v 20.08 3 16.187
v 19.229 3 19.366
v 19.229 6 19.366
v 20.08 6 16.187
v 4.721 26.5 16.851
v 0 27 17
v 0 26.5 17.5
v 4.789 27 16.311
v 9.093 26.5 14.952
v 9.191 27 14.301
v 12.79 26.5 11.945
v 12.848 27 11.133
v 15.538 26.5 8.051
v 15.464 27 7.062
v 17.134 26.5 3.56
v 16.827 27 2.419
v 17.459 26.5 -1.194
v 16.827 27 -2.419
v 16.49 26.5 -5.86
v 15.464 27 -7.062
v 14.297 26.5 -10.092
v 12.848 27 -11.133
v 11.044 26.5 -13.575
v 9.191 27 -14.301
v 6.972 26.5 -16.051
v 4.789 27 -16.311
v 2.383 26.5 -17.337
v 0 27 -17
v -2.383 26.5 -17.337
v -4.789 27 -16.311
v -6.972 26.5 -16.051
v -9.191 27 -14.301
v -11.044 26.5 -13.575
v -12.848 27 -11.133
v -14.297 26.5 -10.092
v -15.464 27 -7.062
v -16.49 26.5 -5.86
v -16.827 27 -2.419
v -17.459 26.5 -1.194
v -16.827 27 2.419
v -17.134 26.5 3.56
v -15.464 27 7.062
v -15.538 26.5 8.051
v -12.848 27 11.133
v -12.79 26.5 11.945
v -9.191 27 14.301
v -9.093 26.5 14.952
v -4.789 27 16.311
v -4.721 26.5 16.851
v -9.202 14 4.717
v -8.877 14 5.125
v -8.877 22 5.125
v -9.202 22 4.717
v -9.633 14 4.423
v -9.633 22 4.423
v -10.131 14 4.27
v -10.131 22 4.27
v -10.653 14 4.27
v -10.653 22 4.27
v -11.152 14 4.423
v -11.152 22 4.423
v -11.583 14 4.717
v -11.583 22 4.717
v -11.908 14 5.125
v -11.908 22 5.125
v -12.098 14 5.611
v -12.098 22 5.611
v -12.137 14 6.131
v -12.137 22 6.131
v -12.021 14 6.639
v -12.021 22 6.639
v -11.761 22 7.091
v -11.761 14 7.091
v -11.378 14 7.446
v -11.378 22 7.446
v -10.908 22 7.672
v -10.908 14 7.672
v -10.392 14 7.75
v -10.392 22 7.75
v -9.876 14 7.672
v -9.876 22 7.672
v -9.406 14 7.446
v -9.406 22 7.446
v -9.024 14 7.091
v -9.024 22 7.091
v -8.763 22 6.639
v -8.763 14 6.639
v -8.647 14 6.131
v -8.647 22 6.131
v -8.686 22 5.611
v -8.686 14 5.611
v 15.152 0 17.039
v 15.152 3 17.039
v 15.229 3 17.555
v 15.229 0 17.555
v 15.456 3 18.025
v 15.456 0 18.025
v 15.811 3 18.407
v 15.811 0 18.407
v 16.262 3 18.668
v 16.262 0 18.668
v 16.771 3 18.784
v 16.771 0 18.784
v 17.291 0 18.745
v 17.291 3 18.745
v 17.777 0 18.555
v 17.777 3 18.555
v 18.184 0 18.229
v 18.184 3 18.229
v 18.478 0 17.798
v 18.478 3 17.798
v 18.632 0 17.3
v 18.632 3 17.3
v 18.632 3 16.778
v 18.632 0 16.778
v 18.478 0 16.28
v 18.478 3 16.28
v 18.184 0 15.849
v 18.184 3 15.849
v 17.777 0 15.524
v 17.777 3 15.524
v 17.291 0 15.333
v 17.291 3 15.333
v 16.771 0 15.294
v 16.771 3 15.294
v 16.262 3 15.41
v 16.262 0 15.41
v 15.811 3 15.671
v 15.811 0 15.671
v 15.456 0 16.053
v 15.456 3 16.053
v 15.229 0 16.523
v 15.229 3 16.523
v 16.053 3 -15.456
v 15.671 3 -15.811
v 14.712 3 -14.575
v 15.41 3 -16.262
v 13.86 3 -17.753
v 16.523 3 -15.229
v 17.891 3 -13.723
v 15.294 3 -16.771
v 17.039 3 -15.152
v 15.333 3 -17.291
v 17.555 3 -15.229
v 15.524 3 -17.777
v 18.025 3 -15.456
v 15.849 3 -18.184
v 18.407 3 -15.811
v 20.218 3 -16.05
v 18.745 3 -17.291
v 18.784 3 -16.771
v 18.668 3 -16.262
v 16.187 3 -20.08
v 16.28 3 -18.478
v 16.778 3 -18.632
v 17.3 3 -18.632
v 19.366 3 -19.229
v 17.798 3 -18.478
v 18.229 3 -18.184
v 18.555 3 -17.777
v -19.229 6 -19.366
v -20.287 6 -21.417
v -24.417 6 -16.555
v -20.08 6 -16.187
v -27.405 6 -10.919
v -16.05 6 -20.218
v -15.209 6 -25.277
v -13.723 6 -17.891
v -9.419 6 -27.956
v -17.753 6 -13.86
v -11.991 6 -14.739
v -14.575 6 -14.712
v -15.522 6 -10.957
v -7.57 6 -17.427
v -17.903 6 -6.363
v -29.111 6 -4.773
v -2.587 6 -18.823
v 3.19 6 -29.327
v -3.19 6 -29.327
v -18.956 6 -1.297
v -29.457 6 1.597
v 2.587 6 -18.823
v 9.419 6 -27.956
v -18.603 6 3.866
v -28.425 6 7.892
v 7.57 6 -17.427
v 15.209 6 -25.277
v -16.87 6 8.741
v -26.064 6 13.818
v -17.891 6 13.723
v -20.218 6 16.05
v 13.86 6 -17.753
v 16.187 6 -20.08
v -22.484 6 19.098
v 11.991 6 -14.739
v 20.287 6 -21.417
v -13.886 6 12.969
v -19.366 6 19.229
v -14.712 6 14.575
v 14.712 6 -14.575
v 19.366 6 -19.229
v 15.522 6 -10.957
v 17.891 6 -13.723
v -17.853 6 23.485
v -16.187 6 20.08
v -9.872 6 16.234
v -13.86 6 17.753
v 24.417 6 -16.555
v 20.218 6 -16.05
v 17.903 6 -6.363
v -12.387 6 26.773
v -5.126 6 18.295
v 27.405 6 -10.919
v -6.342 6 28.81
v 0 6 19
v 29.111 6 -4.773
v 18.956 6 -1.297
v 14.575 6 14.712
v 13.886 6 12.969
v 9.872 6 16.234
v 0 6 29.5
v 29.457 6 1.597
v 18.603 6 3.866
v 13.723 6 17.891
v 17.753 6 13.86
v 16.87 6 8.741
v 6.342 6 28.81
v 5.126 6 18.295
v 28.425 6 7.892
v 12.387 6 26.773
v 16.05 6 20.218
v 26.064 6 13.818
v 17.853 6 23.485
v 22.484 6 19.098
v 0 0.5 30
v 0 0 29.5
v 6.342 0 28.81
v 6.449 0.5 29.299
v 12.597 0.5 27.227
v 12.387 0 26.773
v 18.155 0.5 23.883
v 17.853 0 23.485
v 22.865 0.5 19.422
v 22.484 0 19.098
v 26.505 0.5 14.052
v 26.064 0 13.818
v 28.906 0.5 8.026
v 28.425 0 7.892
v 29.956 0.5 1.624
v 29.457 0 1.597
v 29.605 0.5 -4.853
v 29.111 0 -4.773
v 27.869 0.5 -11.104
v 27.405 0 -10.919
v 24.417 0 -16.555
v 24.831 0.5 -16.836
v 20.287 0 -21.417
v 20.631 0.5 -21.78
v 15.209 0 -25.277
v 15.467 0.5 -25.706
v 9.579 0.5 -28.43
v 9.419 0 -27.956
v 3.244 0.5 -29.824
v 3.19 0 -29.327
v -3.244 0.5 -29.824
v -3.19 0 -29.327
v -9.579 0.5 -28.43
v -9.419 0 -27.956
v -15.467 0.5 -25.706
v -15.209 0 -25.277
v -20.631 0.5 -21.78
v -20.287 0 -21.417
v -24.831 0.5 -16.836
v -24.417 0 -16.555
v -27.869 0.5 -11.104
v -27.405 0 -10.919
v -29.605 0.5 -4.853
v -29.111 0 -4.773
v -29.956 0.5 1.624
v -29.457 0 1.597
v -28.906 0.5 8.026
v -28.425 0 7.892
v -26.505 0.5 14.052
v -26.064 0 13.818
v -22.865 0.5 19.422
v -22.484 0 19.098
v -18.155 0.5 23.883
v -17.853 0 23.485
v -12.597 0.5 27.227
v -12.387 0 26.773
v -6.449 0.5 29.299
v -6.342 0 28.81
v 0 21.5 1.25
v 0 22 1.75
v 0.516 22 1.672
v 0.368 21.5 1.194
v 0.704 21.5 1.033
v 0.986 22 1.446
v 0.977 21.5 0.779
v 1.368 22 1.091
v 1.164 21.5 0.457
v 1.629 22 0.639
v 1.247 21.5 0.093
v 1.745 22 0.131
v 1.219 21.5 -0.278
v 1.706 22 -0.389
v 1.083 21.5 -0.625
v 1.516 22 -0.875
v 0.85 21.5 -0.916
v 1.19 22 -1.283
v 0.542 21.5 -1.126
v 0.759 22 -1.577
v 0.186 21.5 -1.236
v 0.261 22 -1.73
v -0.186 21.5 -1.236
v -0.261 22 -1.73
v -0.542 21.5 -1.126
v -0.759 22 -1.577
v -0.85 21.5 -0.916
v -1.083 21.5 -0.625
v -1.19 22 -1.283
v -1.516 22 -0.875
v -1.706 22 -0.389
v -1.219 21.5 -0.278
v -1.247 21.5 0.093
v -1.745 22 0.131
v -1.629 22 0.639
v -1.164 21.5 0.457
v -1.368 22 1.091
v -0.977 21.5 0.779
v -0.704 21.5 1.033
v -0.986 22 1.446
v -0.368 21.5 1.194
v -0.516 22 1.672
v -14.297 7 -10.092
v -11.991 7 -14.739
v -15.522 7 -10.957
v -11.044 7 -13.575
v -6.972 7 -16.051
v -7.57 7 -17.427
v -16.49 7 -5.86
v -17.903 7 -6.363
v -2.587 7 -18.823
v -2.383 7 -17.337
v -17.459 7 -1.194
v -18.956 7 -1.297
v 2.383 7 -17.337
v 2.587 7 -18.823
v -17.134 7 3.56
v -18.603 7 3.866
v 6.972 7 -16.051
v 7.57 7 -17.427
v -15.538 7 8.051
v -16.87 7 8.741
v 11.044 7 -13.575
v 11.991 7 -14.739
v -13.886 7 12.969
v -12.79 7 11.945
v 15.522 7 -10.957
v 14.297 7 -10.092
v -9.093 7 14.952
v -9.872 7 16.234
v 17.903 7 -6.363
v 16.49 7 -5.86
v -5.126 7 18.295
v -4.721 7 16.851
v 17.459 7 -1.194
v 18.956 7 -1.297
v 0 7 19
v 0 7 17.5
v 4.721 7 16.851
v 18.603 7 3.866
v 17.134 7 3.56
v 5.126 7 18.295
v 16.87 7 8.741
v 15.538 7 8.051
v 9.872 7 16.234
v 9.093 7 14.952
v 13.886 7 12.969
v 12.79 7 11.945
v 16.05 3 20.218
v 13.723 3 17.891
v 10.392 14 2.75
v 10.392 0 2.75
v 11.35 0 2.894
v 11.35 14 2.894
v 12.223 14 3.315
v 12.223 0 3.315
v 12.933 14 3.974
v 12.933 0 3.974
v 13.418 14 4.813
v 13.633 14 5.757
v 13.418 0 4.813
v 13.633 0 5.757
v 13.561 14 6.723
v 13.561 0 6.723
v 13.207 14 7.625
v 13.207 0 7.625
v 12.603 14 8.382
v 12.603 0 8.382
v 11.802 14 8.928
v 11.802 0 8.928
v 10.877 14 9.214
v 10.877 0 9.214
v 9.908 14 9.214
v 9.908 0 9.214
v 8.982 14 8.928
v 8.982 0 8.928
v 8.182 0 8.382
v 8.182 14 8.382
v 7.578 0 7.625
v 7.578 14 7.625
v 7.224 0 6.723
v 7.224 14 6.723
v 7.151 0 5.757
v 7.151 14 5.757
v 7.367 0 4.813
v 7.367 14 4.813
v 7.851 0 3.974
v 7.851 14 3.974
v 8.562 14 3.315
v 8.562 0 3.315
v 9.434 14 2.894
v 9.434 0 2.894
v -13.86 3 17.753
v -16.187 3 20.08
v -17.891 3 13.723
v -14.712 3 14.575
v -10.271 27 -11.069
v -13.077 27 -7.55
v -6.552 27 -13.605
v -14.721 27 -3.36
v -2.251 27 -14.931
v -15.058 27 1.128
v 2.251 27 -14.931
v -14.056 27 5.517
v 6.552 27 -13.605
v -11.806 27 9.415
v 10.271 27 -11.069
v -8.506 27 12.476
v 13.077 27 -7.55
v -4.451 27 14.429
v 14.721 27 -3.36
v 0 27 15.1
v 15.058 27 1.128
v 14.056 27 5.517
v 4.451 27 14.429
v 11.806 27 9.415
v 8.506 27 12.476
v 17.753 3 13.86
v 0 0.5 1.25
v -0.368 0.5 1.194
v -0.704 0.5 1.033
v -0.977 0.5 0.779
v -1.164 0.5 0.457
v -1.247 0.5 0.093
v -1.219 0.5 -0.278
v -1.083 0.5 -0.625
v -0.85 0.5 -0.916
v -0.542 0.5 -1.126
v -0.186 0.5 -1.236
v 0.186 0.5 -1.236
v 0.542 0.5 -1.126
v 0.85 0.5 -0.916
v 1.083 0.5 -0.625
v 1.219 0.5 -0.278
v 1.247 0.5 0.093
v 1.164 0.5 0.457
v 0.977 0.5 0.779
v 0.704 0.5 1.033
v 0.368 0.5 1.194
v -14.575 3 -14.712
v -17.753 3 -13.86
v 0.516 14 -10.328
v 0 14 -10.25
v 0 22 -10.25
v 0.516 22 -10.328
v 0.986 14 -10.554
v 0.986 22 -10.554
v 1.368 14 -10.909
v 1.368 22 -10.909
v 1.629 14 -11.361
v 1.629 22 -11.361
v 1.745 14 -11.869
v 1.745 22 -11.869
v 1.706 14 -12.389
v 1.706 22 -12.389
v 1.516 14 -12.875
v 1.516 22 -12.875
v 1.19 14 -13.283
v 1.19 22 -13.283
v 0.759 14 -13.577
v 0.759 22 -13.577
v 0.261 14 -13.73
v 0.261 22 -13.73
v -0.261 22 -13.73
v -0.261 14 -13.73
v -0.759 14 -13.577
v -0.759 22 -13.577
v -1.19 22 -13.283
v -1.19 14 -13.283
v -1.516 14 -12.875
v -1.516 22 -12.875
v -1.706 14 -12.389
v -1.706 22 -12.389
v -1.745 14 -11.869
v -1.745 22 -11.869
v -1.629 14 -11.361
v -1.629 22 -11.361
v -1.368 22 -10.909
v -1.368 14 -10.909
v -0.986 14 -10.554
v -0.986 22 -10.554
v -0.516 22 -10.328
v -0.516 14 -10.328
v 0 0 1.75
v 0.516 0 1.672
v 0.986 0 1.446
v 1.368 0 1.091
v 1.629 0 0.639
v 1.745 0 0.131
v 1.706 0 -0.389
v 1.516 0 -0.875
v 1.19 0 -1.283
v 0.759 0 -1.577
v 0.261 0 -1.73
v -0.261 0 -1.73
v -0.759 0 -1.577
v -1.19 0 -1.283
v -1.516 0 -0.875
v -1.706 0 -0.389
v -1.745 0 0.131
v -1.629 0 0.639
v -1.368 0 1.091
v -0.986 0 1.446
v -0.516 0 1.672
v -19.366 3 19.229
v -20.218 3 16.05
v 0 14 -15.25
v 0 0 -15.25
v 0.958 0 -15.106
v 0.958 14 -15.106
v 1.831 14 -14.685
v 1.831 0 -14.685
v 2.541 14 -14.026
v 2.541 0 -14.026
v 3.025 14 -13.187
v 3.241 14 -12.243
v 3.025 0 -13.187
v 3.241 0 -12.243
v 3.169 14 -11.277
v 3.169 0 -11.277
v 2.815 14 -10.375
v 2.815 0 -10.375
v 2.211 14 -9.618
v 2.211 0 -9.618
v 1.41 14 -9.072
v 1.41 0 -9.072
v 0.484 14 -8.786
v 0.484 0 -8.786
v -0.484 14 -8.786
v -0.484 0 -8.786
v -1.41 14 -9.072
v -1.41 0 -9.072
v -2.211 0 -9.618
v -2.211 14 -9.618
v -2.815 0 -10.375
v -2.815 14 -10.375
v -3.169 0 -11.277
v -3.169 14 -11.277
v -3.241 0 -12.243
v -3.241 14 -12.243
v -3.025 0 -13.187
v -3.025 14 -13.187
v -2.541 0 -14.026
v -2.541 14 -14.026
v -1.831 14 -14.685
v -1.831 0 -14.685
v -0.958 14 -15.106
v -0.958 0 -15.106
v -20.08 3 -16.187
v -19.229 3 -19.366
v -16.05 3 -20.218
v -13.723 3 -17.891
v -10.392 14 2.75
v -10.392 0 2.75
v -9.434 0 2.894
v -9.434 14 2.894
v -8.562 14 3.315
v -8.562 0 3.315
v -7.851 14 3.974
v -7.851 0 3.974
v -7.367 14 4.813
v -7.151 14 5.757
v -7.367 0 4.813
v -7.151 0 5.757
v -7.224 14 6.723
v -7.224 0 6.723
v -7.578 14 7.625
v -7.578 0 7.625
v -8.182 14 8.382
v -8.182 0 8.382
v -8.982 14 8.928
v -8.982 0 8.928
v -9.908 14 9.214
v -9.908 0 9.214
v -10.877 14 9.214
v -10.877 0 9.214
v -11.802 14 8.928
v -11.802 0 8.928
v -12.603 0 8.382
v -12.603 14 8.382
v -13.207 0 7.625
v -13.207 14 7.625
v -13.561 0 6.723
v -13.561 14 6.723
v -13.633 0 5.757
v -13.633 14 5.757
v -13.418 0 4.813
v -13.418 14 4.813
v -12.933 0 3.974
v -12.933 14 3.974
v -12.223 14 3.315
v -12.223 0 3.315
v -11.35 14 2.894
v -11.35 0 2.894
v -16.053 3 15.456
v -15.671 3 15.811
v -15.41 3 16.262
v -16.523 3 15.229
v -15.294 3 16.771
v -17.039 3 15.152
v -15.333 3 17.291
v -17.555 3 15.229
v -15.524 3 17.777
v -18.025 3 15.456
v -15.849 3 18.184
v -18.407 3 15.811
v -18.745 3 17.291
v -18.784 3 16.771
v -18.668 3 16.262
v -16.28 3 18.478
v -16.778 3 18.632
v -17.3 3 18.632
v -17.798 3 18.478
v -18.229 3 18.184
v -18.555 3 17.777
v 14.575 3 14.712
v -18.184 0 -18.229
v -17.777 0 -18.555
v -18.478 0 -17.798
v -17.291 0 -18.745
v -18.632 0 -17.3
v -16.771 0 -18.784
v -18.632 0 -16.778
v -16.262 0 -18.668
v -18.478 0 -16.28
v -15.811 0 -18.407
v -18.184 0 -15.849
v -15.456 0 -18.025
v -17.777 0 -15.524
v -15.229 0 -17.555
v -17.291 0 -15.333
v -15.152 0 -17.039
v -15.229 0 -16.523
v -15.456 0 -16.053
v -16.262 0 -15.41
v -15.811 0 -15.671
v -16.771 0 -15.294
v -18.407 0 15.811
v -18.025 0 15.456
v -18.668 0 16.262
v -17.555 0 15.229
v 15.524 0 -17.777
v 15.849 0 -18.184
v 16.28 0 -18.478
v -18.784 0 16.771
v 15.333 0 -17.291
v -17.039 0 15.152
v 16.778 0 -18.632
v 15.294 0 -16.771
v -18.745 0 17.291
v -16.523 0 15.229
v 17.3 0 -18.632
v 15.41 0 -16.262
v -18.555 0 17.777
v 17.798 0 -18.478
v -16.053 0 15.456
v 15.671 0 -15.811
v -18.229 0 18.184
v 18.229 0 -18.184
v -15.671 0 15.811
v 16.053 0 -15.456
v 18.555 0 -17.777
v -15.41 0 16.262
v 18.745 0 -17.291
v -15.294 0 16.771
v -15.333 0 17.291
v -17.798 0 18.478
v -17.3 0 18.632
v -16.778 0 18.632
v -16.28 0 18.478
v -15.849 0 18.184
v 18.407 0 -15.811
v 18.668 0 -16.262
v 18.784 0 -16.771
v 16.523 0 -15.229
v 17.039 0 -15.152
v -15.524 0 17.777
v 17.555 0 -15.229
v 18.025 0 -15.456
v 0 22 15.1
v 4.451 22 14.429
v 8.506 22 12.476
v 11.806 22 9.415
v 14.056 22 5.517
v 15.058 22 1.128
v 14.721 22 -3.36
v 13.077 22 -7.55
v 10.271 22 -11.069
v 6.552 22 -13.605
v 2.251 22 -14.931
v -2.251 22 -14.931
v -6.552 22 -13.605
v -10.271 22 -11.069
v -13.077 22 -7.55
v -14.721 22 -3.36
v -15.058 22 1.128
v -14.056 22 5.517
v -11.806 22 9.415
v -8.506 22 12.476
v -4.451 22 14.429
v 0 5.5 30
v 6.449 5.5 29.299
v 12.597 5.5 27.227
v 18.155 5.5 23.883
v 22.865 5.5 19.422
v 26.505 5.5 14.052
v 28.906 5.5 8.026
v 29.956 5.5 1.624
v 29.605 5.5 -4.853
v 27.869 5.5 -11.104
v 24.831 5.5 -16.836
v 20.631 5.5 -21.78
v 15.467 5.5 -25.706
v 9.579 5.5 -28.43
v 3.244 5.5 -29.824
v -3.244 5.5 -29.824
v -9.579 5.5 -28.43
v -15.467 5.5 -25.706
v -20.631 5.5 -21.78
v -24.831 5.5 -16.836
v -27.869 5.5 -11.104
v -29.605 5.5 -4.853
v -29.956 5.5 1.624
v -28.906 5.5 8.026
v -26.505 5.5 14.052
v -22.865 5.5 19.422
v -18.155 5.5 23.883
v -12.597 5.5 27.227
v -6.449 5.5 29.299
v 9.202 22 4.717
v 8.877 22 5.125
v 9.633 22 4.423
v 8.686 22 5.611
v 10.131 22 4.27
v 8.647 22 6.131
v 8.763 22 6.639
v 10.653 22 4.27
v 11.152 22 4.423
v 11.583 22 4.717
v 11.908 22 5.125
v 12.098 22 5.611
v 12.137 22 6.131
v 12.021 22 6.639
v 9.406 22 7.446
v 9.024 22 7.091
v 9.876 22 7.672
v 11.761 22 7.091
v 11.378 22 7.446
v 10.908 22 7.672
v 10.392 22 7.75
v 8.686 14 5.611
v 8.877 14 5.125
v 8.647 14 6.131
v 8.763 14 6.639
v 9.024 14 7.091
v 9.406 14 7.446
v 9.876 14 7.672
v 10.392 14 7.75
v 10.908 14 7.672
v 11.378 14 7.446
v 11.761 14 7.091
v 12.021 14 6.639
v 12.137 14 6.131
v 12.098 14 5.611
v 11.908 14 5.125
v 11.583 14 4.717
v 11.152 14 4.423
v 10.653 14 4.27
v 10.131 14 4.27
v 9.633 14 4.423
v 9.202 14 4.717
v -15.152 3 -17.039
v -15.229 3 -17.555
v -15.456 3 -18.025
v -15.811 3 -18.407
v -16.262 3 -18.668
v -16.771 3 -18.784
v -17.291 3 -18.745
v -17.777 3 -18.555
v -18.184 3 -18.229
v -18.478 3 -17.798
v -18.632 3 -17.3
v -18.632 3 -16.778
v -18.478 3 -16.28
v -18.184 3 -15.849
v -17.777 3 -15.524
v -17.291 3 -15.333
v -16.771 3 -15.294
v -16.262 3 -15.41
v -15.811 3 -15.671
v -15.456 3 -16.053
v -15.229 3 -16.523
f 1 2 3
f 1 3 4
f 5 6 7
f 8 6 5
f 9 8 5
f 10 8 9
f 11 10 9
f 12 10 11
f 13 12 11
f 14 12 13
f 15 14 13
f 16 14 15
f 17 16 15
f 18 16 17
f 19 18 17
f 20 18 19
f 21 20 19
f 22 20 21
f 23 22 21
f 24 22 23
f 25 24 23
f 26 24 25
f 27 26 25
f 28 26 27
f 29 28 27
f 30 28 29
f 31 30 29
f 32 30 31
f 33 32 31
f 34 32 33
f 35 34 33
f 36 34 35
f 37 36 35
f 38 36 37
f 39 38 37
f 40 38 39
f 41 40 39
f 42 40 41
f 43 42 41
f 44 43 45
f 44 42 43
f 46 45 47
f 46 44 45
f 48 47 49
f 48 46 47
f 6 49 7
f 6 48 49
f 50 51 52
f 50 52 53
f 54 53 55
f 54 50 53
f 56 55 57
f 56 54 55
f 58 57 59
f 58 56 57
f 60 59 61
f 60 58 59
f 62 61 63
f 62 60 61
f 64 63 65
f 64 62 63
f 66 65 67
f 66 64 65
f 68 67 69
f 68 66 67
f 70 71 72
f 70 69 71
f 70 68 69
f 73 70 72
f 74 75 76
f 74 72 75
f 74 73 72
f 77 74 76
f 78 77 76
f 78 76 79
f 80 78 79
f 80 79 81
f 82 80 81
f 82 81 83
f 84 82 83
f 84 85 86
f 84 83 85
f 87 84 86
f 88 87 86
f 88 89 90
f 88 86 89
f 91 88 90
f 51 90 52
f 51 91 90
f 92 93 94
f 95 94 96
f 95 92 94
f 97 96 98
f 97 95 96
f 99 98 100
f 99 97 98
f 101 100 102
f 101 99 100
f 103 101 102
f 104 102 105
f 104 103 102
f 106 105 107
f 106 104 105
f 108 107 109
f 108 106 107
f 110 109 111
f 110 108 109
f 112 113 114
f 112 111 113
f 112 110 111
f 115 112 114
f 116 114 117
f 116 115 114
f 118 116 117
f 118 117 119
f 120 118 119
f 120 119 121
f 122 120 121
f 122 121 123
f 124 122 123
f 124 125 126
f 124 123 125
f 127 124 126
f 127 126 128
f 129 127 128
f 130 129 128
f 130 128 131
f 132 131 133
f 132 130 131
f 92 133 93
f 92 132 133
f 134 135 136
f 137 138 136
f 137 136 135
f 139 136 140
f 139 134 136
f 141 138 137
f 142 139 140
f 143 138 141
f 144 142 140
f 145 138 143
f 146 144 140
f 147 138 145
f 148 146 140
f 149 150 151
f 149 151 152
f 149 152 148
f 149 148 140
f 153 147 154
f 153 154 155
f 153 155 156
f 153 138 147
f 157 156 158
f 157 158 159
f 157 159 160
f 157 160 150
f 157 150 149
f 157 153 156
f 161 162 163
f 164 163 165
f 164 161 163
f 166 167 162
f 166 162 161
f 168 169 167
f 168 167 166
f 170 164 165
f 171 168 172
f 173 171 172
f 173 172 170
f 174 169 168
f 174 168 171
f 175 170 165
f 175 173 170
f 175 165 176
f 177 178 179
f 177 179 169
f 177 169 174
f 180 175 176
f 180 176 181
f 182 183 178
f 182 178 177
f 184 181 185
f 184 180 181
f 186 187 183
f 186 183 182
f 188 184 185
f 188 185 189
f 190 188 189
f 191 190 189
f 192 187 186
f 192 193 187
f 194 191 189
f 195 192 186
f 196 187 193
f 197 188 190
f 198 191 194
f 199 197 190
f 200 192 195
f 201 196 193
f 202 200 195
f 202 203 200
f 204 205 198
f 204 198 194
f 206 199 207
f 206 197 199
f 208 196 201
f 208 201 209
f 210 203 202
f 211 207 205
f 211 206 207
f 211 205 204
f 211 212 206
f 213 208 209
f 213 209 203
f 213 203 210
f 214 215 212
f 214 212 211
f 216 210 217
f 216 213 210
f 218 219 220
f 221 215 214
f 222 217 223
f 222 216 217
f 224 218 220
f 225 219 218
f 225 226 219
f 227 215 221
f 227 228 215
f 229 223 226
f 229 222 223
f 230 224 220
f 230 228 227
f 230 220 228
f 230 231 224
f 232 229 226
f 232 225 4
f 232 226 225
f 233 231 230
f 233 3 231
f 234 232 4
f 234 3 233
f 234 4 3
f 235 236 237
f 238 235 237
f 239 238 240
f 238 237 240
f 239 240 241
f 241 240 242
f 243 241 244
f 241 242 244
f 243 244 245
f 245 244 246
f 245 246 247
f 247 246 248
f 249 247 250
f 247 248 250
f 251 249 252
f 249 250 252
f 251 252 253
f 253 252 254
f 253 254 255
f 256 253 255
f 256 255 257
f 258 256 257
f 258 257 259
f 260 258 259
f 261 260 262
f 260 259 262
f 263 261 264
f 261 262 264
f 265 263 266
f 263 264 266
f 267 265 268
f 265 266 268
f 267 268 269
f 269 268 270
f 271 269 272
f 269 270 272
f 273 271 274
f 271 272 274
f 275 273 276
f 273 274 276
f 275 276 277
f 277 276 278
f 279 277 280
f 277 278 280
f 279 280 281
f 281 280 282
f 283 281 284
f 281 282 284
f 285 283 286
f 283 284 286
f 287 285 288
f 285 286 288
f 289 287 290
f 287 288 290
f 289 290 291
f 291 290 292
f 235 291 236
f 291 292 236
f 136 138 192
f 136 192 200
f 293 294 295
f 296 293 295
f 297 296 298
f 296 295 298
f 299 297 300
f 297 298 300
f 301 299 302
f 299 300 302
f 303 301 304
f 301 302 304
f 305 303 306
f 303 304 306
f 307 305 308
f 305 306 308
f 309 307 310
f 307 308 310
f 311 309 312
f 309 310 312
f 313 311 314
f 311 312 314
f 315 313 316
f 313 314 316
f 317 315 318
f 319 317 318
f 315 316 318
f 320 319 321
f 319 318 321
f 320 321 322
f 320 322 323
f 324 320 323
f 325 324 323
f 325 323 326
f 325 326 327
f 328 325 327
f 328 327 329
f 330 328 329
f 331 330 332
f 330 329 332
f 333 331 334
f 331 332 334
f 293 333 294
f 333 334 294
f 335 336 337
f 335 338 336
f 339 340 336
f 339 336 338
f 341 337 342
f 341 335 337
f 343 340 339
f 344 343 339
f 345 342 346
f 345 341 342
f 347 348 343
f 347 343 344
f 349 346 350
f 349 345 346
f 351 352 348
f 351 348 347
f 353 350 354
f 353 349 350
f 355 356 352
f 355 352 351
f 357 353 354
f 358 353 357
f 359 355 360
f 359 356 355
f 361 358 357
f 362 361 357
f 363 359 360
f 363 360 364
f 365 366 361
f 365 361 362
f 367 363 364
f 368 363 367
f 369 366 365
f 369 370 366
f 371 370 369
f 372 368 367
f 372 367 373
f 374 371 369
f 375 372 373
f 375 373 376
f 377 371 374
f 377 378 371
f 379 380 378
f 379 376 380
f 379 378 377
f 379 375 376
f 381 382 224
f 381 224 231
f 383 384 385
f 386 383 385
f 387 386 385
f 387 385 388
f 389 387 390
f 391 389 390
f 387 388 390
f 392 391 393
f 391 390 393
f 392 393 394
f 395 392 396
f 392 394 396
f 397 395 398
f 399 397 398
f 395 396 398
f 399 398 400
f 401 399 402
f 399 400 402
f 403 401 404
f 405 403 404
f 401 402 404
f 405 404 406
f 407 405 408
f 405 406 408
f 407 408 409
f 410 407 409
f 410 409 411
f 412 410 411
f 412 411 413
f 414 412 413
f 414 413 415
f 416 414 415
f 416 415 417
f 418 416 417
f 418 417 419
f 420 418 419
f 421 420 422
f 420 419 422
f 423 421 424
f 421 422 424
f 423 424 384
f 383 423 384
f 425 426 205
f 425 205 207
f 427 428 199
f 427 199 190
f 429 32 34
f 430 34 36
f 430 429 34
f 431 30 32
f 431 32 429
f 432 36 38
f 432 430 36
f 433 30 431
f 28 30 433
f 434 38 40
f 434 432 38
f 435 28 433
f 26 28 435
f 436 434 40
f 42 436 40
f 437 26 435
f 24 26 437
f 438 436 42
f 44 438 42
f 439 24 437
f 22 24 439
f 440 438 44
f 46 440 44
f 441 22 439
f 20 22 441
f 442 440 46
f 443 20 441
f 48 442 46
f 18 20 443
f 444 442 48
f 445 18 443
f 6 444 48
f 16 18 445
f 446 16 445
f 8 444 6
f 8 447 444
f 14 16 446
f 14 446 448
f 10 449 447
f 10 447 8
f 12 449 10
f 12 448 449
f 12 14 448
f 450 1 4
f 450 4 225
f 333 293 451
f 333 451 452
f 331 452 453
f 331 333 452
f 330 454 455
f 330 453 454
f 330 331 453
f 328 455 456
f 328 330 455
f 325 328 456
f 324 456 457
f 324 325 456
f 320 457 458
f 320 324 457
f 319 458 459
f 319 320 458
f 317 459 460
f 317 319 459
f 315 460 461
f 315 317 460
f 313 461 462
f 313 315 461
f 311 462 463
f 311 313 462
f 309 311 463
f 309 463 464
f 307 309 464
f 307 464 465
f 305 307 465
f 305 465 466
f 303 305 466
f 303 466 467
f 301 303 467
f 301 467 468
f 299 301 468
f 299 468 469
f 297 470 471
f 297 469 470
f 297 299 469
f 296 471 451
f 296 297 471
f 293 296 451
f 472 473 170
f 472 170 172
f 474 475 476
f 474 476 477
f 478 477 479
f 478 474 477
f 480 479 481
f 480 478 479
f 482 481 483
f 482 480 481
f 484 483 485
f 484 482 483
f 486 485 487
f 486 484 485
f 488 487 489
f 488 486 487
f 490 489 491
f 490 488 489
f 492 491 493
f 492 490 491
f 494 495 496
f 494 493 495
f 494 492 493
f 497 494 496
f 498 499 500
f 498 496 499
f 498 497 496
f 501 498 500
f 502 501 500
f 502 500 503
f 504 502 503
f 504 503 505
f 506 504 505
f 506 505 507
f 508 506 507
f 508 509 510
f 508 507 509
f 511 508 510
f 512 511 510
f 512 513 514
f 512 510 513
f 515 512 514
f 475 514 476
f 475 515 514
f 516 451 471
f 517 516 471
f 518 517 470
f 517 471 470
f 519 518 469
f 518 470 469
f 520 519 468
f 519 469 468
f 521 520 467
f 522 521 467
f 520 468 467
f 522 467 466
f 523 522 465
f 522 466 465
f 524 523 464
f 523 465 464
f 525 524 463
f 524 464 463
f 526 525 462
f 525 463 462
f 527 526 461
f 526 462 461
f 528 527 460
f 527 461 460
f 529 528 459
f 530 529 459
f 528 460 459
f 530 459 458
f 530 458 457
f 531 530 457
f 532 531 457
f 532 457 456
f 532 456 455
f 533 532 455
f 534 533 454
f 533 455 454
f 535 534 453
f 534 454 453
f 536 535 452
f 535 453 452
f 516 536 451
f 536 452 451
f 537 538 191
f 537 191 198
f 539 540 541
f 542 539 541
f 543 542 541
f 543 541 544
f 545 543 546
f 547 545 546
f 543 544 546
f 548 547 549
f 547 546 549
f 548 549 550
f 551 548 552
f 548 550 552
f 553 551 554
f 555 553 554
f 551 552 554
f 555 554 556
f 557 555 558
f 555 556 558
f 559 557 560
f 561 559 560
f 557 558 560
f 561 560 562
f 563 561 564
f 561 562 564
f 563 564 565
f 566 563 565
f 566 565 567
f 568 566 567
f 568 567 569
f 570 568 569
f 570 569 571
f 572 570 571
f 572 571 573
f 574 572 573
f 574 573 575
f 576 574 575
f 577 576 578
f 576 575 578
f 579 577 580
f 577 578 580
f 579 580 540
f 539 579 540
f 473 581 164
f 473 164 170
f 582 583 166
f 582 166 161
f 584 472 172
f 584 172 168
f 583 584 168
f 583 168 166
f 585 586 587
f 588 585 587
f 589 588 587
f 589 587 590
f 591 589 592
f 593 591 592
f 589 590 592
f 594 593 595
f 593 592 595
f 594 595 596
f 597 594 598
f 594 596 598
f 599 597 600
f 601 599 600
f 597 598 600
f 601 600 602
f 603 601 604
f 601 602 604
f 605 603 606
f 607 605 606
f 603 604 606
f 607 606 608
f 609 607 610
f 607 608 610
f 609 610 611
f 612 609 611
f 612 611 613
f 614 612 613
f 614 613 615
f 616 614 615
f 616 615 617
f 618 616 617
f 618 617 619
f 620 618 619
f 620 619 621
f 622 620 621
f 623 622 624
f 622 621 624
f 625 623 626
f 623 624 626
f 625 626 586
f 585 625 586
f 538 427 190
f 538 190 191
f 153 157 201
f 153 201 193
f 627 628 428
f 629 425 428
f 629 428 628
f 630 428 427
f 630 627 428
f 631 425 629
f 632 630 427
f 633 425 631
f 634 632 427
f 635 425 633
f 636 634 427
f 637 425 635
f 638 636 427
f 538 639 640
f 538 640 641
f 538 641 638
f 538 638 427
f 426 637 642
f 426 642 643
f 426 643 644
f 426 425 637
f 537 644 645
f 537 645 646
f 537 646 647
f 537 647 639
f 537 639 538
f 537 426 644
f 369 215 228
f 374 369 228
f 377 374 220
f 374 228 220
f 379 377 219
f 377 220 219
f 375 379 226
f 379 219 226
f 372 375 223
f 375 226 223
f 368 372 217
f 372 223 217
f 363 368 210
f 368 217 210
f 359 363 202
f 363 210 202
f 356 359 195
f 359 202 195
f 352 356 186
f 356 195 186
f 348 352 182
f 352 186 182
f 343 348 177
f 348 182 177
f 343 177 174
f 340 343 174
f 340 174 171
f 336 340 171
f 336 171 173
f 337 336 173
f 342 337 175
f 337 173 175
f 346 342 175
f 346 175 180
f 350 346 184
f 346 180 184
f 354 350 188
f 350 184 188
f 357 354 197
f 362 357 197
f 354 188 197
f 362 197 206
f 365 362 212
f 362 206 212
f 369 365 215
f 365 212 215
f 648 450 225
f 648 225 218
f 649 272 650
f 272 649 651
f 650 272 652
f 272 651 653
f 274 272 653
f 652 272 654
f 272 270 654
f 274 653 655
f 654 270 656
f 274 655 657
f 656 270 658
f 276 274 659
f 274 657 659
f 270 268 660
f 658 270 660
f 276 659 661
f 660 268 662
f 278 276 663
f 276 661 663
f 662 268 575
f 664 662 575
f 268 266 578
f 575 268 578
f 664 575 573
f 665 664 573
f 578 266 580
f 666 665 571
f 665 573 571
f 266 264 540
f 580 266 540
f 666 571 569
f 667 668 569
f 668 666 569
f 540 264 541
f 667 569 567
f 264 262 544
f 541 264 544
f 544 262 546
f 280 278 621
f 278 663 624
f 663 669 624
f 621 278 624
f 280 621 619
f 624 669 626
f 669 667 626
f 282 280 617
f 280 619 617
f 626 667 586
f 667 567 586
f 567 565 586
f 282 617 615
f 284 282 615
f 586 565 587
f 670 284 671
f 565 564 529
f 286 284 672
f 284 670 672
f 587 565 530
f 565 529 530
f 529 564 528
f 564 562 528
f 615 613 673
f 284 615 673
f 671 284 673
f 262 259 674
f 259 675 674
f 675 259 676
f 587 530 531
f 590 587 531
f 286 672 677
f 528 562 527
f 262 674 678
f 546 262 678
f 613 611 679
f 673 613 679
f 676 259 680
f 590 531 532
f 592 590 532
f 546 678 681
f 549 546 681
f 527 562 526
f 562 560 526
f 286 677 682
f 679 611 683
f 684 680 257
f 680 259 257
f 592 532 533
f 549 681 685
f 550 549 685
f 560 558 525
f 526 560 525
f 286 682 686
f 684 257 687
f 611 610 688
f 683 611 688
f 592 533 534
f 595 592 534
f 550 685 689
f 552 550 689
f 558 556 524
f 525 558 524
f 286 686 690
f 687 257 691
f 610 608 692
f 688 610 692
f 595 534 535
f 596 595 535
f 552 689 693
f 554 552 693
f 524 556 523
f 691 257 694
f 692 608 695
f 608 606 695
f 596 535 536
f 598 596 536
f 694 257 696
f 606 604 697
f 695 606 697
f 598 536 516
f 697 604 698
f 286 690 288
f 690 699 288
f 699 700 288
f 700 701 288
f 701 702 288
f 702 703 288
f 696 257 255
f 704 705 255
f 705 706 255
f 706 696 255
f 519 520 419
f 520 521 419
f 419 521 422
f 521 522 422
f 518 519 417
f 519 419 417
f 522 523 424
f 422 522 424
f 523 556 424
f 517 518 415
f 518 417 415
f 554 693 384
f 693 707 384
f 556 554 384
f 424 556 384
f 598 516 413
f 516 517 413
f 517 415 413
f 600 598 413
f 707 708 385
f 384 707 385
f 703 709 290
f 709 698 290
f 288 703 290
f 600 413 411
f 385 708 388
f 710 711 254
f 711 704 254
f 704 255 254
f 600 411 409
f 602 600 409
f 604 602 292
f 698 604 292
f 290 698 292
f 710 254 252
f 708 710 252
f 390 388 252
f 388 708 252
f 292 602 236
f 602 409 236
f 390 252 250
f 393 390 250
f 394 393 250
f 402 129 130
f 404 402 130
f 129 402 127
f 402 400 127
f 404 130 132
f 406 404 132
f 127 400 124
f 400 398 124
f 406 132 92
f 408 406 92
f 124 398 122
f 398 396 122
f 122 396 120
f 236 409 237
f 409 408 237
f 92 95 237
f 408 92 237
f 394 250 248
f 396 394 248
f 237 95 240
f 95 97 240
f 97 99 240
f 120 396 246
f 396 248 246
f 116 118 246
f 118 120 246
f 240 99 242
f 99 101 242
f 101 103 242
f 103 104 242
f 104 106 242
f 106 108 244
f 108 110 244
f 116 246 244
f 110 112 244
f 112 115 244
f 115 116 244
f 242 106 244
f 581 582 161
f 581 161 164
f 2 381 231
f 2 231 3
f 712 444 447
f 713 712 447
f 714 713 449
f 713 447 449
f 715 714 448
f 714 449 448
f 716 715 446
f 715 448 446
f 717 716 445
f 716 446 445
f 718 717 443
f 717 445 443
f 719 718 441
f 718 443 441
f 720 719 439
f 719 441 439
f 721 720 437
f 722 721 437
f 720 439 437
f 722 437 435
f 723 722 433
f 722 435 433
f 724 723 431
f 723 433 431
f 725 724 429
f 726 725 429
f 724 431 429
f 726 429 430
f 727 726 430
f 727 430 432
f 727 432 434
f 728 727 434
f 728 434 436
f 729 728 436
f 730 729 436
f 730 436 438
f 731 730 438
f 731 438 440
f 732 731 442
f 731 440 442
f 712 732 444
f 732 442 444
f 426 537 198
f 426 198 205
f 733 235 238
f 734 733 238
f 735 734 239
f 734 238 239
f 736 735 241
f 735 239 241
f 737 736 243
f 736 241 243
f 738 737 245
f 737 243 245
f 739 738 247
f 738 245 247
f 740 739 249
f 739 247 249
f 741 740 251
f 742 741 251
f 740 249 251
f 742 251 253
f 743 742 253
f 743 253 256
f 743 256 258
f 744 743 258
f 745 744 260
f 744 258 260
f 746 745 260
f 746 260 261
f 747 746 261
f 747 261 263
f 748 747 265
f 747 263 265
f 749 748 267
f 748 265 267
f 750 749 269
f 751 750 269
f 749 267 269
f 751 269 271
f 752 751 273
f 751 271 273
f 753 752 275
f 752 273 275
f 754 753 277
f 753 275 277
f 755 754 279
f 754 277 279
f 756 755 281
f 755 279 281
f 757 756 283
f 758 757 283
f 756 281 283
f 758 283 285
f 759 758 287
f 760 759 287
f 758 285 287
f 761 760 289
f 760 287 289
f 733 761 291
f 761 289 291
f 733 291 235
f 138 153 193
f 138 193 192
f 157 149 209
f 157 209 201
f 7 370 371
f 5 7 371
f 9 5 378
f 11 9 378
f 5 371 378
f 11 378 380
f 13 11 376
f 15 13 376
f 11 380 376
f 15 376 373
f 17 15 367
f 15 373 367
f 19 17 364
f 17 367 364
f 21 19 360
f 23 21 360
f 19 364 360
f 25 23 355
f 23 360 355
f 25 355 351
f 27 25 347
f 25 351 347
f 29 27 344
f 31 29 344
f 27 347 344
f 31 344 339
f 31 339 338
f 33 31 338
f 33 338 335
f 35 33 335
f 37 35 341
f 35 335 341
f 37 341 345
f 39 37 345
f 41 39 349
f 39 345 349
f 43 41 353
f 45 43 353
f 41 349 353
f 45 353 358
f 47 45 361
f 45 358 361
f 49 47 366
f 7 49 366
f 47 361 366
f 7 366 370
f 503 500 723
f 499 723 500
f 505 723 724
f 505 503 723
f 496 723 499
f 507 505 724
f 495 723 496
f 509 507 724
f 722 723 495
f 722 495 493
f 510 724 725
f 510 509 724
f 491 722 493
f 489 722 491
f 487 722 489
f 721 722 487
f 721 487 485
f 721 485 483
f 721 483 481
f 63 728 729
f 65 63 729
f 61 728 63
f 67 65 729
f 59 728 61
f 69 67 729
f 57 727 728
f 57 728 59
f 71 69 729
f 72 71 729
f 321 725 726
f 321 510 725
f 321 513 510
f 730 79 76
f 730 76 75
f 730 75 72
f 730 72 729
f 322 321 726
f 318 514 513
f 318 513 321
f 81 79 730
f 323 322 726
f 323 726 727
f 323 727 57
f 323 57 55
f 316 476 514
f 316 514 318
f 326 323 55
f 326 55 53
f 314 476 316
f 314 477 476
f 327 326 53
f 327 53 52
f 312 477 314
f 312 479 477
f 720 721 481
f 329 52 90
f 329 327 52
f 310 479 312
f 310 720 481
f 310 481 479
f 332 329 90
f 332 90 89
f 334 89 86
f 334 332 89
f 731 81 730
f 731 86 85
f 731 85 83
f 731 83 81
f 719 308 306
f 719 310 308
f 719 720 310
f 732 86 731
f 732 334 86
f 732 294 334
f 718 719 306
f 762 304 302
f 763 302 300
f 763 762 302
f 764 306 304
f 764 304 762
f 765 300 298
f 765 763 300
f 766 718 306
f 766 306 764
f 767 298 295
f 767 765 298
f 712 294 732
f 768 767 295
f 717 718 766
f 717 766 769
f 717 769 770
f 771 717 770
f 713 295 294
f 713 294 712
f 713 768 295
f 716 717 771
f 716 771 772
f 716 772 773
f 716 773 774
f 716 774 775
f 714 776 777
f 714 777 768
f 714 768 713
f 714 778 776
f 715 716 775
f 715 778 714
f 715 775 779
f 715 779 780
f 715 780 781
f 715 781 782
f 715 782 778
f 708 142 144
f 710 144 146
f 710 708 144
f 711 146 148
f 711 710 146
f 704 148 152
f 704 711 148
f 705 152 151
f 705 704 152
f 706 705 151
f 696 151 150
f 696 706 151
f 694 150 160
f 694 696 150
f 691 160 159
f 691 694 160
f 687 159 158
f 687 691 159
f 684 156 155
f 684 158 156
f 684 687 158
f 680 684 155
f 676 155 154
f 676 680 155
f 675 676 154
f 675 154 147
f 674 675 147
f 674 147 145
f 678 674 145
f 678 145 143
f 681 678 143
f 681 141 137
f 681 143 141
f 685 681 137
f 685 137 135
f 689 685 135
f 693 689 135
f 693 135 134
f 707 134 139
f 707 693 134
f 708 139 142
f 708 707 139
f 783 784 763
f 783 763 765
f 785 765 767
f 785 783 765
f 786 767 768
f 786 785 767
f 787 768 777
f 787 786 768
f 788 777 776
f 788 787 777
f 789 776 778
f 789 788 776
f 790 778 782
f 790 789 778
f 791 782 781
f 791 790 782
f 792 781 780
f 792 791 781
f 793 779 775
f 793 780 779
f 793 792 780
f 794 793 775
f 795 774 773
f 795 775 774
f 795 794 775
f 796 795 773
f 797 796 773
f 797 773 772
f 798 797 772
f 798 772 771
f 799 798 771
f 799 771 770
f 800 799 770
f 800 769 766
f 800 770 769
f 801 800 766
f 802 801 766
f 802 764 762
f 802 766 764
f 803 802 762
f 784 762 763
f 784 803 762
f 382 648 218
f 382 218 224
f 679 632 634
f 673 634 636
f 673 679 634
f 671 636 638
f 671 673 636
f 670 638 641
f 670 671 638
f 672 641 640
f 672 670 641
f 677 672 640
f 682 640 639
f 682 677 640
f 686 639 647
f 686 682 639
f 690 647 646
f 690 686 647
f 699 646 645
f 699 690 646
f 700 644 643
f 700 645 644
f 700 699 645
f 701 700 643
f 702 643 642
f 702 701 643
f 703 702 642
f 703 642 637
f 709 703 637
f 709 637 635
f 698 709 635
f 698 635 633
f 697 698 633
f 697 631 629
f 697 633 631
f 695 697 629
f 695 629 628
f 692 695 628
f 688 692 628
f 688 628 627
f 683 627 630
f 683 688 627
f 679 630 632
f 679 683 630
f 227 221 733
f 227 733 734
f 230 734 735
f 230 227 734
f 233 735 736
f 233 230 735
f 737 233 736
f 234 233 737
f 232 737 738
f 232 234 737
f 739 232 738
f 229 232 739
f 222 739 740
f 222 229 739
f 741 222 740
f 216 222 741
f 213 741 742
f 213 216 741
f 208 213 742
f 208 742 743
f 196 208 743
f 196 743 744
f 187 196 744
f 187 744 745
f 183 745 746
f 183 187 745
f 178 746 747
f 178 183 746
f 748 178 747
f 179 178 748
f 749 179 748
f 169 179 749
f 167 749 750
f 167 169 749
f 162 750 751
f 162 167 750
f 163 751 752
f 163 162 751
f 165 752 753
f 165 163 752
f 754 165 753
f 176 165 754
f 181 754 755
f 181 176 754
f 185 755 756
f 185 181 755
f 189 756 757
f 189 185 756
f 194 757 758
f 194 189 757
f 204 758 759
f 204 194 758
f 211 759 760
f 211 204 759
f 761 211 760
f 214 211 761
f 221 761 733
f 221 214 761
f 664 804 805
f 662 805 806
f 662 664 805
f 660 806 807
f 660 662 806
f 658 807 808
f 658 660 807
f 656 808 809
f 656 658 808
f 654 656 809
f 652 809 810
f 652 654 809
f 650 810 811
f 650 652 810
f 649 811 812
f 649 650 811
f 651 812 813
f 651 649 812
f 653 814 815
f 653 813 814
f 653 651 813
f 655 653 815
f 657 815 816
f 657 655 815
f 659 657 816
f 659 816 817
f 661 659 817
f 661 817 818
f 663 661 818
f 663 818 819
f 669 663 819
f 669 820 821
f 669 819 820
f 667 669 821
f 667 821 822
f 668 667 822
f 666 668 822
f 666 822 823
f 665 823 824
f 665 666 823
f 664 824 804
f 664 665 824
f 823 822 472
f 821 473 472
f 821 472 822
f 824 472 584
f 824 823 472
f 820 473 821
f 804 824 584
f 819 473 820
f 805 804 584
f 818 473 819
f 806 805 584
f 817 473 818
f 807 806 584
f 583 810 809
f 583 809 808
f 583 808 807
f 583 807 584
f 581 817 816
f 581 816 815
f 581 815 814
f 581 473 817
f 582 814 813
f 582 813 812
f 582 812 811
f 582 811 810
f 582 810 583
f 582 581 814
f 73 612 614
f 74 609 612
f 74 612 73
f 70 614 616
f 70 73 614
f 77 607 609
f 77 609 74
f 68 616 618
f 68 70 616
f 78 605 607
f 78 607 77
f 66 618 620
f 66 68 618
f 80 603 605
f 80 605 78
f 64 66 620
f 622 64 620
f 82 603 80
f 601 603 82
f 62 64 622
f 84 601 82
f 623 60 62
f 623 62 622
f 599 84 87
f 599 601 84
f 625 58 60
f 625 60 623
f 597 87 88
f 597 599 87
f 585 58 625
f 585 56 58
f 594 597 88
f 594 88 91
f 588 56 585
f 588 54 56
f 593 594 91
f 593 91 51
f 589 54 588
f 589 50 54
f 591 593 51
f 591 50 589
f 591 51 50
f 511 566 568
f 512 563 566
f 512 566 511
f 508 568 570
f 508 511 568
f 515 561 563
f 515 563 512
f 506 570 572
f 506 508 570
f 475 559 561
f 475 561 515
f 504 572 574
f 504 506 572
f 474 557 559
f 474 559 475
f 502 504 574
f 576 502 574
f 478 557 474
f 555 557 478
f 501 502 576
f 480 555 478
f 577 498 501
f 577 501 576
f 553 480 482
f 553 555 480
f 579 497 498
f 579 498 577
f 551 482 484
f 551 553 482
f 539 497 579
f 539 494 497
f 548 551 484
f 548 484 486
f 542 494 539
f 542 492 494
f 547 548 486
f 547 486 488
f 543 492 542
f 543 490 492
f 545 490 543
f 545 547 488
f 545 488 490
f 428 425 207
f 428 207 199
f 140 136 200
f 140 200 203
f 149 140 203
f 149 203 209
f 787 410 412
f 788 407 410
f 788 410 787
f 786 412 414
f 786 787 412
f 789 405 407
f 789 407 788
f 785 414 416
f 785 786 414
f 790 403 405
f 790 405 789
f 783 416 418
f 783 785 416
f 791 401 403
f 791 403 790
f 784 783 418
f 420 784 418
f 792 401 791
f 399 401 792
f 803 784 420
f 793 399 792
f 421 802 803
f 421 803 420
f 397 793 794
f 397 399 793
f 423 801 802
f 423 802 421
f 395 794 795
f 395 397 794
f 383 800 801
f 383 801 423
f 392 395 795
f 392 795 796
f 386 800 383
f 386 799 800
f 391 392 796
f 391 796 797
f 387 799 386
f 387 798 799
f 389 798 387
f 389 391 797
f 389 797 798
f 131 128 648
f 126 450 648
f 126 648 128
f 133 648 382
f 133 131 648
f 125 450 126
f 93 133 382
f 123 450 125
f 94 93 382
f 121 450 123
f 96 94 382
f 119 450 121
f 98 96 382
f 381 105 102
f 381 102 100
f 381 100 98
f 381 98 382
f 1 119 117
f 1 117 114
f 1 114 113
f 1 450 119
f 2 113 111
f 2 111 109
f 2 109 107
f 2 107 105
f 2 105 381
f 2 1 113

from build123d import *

# Parameters (mm, degrees)
SKETCH_1_R               = 30
EXTRUDE_1_DEPTH          = 6
EXTRUDE_START            = 6
SKETCH_3_R               = 19
EXTRUDE_2_DEPTH          = 1
EXTRUDE_START_2          = 7
SKETCH_4_R               = 17.5
EXTRUDE_3_DEPTH          = 20
SKETCH_5_R               = 15.1
CUT_EXTRUDE_1_DEPTH      = 5
SKETCH_6_R               = 1.75
CUT_EXTRUDE_2_DEPTH      = 51.289163843
PATTERN_CIRCULAR_1_COUNT = 3
SKETCH1_R                = 3.25
CUT_EXTRUDE1_DEPTH       = 14
CUT_EXTRUDE_3_DEPTH      = 51.289163843
CUT_EXTRUDE_3_DEPTH_BACK = 51.289163843
SKETCH_7_R               = 1.25
SKETCH_8_R               = 1.75
CUT_EXTRUDE_4_DEPTH      = 51.289163843
CUT_EXTRUDE_START        = 3
CUT_EXTRUDE_5_DEPTH      = 10
PATTERN_CIRCULAR_2_COUNT = 4
CHAMFER2_SIZE            = 0.5
CHAMFER1_SIZE            = 0.5


with BuildPart() as part:
    # Эскиз1 → Бобышка-Вытянуть1 (new body)
    with BuildSketch(Plane(origin=(0, 0, 0), x_dir=(1, 0, 0), z_dir=(0, 1, 0))):
        Circle(SKETCH_1_R)
    extrude(amount=EXTRUDE_1_DEPTH)

    # Эскиз3 → Бобышка-Вытянуть2 (add)
    with BuildSketch(Plane(origin=(0, 0, 0), x_dir=(1, 0, 0), z_dir=(0, 1, 0)).offset(EXTRUDE_START)):
        Circle(SKETCH_3_R)
    extrude(amount=EXTRUDE_2_DEPTH)

    # Эскиз4 → Бобышка-Вытянуть3 (add)
    with BuildSketch(Plane(origin=(0, 0, 0), x_dir=(1, 0, 0), z_dir=(0, 1, 0)).offset(EXTRUDE_START_2)):
        Circle(SKETCH_4_R)
    extrude(amount=EXTRUDE_3_DEPTH)

    # Эскиз5 → Вырез-Вытянуть1 (cut)
    with BuildSketch(Plane(origin=(0, 27, 0), x_dir=(1, 0, 0), z_dir=(0, 1, 0))):
        Circle(SKETCH_5_R)
    extrude(amount=-CUT_EXTRUDE_1_DEPTH, mode=Mode.SUBTRACT)

    # Эскиз6 → Вырез-Вытянуть2 (cut, through all)
    with BuildSketch(Plane(origin=(0, 0, 0), x_dir=(1, 0, 0), z_dir=(0, 1, 0))):
        with Locations((0, 12)):
            Circle(SKETCH_6_R)
    cut_extrude_2 = extrude(amount=CUT_EXTRUDE_2_DEPTH, mode=Mode.SUBTRACT)

    # Круговой массив1: Вырез-Вытянуть2 ×3 about axis
    pattern_circular_1_axis = Axis((0, 27, 0), (0, -1, 0))
    for i in range(1, PATTERN_CIRCULAR_1_COUNT):
        add(cut_extrude_2.rotate(pattern_circular_1_axis, i * 360 / PATTERN_CIRCULAR_1_COUNT), mode=Mode.SUBTRACT)

    # Sketch1 → Cut-Extrude1 (cut)
    with BuildSketch(Plane.XZ):
        with Locations((-10.392304845, 6)):
            Circle(SKETCH1_R)
        with Locations((10.392304845, 6)):
            Circle(SKETCH1_R)
        with Locations((0, -12)):
            Circle(SKETCH1_R)
    extrude(amount=-CUT_EXTRUDE1_DEPTH, mode=Mode.SUBTRACT)

    # Эскиз7 → Вырез-Вытянуть3 (cut, two sides: drawn at the far end of the back side and taken through both)
    with BuildSketch(Plane.XZ.offset(-CUT_EXTRUDE_3_DEPTH_BACK)):
        Circle(SKETCH_7_R)
    extrude(amount=CUT_EXTRUDE_3_DEPTH + CUT_EXTRUDE_3_DEPTH_BACK, mode=Mode.SUBTRACT)

    # Эскиз8 → Вырез-Вытянуть4 (cut, through all)
    with BuildSketch(Plane(origin=(0, 0, 0), x_dir=(1, 0, 0), z_dir=(0, 1, 0))):
        with Locations((17.039195094, 16.901651711)):
            Circle(SKETCH_8_R)
    cut_extrude_4 = extrude(amount=CUT_EXTRUDE_4_DEPTH, mode=Mode.SUBTRACT)

    # Эскиз8<3> → Вырез-Вытянуть5 (cut)
    with BuildSketch(Plane(origin=(0, 0, 0), x_dir=(1, 0, 0), z_dir=(0, 1, 0)).offset(CUT_EXTRUDE_START)):
        Polygon((14.712179838, 14.574636455), (17.890941793, 13.722889756), (20.217957048, 16.049905012), (19.36621035, 19.228666966), (16.187448396, 20.080413665), (13.86043314, 17.753398409), align=None)
    cut_extrude_5 = extrude(amount=CUT_EXTRUDE_5_DEPTH, mode=Mode.SUBTRACT)

    # Круговой массив2: Вырез-Вытянуть4, Вырез-Вытянуть5 ×4 about axis
    pattern_circular_2_axis = Axis((0, 6, 0), (0, -1, 0))
    add([cut_extrude_4.rotate(pattern_circular_2_axis, i * 360 / PATTERN_CIRCULAR_2_COUNT) for i in range(1, PATTERN_CIRCULAR_2_COUNT)], mode=Mode.SUBTRACT)
    add([cut_extrude_5.rotate(pattern_circular_2_axis, i * 360 / PATTERN_CIRCULAR_2_COUNT) for i in range(1, PATTERN_CIRCULAR_2_COUNT)], mode=Mode.SUBTRACT)

    # Chamfer2
    chamfer2_edges = [part.edges().sort_by_distance(p)[0] for p in [
        (-30, 0, 0),
        (-30, 6, 0),
    ]]
    chamfer(chamfer2_edges, length=CHAMFER2_SIZE)

    # Chamfer1
    chamfer1_edges = [part.edges().sort_by_distance(p)[0] for p in [
        (-17.5, 27, 0),
        (-1.25, 0, 0),
        (-1.25, 22, 0),
    ]]
    chamfer(chamfer1_edges, length=CHAMFER1_SIZE)


solid = part.part
